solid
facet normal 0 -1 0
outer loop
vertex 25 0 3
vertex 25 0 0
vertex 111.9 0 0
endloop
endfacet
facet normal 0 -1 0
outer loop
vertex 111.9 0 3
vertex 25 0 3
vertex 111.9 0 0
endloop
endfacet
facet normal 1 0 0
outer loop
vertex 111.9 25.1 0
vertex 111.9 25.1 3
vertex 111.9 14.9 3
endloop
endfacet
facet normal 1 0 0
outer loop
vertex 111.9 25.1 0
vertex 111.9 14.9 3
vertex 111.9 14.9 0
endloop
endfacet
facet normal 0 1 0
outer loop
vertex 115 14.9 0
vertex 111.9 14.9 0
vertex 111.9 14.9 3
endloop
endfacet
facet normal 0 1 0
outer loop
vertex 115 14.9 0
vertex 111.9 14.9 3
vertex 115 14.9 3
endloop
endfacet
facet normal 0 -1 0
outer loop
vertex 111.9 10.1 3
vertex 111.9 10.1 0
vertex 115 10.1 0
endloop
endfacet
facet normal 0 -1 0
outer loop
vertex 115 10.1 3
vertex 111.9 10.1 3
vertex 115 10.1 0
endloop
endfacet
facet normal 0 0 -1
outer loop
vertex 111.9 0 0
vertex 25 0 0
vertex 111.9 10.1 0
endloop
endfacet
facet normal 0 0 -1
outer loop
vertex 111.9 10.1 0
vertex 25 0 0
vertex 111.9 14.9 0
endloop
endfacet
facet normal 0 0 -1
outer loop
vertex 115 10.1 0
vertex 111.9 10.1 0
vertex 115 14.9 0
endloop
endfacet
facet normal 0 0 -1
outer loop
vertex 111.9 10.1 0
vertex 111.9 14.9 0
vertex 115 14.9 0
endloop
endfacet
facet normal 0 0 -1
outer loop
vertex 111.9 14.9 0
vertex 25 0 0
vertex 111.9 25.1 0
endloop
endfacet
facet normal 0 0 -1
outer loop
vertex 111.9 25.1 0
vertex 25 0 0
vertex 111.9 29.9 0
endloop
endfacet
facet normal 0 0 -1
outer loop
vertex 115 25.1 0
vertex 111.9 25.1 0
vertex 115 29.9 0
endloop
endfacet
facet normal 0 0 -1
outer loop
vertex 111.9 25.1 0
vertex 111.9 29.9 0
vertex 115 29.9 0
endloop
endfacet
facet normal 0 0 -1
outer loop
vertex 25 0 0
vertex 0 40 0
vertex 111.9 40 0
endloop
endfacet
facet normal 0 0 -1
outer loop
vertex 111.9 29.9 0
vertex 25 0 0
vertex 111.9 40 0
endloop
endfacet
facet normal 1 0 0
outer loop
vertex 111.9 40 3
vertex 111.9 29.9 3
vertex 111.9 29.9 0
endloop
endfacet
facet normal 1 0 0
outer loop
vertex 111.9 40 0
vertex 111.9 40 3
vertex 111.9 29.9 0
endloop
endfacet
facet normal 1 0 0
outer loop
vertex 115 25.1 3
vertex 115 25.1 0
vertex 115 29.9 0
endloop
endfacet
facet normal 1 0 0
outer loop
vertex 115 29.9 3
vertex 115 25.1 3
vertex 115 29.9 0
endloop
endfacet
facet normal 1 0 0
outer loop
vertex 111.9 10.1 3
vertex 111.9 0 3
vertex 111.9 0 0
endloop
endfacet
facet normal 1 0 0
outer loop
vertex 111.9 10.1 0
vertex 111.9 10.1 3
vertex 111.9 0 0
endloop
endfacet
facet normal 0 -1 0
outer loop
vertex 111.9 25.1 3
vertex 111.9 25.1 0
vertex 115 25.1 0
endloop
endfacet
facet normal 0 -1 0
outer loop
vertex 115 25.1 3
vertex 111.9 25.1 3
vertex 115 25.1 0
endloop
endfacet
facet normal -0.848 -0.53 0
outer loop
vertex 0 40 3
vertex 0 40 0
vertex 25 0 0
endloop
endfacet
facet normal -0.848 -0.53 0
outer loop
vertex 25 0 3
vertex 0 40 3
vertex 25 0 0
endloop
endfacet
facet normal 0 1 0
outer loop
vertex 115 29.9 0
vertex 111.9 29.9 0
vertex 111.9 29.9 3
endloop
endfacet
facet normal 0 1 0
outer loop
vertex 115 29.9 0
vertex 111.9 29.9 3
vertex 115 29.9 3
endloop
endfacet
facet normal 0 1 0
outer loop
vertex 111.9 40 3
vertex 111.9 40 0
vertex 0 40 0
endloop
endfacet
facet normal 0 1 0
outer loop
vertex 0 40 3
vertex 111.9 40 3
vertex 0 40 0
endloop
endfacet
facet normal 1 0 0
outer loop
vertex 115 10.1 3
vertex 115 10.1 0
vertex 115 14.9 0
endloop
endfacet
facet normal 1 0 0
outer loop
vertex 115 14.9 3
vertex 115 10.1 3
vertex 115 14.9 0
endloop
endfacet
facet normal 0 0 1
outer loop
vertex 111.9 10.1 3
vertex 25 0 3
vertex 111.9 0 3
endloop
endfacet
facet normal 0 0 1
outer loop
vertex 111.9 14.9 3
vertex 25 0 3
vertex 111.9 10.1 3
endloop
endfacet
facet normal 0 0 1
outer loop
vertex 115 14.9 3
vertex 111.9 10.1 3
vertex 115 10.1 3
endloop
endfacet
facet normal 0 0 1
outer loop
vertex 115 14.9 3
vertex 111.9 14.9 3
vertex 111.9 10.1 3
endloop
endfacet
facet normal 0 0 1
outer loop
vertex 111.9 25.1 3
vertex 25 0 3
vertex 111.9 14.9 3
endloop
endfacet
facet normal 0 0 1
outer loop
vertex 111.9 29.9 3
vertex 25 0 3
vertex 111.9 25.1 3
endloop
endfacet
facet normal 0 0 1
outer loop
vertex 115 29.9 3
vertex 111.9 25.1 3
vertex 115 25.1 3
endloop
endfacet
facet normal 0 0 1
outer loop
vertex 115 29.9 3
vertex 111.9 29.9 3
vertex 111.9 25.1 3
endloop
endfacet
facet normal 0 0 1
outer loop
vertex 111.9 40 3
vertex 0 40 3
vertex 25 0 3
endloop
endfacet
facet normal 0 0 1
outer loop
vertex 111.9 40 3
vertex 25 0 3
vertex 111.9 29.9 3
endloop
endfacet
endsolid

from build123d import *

# Parameters (mm, degrees)
T_LE_DE_BASE_PLI_E1_DEPTH              = 3
TENON_START                            = 14.9
TENON_ET_MORTAISE_RAINURE1_OUTLINE_W   = 3.1
TENON_ET_MORTAISE_RAINURE1_OUTLINE_H   = 3
TENON_ET_MORTAISE_RAINURE1_DEPTH       = 10.2
TENON_ET_MORTAISE_RAINURE1_2_OUTLINE_W = 3.1
TENON_ET_MORTAISE_RAINURE1_2_OUTLINE_H = 3
TENON_ET_MORTAISE_RAINURE1_2_DEPTH     = 10.1
TENON_START_2                          = 29.9
TENON_ET_MORTAISE_RAINURE1_3_OUTLINE_W = 3.1
TENON_ET_MORTAISE_RAINURE1_3_OUTLINE_H = 3
TENON_ET_MORTAISE_RAINURE1_3_DEPTH     = 10.1


# Read off the part's stored shape, not the designer's step: Tenon et mortaise-Rainure1
# Sheet-metal steps are written as plain solids
with BuildPart() as part:
    # Esquisse1 → Tôle de base pliée1 (new body)
    with BuildSketch(Plane.XY):
        Polygon((25, 0), (115, 0), (115, 40), (0, 40), align=None)
    extrude(amount=T_LE_DE_BASE_PLI_E1_DEPTH)

    # Tenon et mortaise-Rainure1 outline → Tenon et mortaise-Rainure1 (cut)
    with BuildSketch(Plane(origin=(0, 0, 0), x_dir=(1, 0, 0), z_dir=(0, 1, 0)).offset(TENON_START)):
        with Locations((113.45, -1.5)):
            Rectangle(TENON_ET_MORTAISE_RAINURE1_OUTLINE_W, TENON_ET_MORTAISE_RAINURE1_OUTLINE_H)
    extrude(amount=TENON_ET_MORTAISE_RAINURE1_DEPTH, mode=Mode.SUBTRACT)

    # Tenon et mortaise-Rainure1 2 outline → Tenon et mortaise-Rainure1 2 (cut)
    with BuildSketch(Plane(origin=(0, 0, 0), x_dir=(1, 0, 0), z_dir=(0, 1, 0))):
        with Locations((113.45, -1.5)):
            Rectangle(TENON_ET_MORTAISE_RAINURE1_2_OUTLINE_W, TENON_ET_MORTAISE_RAINURE1_2_OUTLINE_H)
    extrude(amount=TENON_ET_MORTAISE_RAINURE1_2_DEPTH, mode=Mode.SUBTRACT)

    # Tenon et mortaise-Rainure1 3 outline → Tenon et mortaise-Rainure1 3 (cut)
    with BuildSketch(Plane(origin=(0, 0, 0), x_dir=(1, 0, 0), z_dir=(0, 1, 0)).offset(TENON_START_2)):
        with Locations((113.45, -1.5)):
            Rectangle(TENON_ET_MORTAISE_RAINURE1_3_OUTLINE_W, TENON_ET_MORTAISE_RAINURE1_3_OUTLINE_H)
    extrude(amount=TENON_ET_MORTAISE_RAINURE1_3_DEPTH, mode=Mode.SUBTRACT)


solid = part.part
